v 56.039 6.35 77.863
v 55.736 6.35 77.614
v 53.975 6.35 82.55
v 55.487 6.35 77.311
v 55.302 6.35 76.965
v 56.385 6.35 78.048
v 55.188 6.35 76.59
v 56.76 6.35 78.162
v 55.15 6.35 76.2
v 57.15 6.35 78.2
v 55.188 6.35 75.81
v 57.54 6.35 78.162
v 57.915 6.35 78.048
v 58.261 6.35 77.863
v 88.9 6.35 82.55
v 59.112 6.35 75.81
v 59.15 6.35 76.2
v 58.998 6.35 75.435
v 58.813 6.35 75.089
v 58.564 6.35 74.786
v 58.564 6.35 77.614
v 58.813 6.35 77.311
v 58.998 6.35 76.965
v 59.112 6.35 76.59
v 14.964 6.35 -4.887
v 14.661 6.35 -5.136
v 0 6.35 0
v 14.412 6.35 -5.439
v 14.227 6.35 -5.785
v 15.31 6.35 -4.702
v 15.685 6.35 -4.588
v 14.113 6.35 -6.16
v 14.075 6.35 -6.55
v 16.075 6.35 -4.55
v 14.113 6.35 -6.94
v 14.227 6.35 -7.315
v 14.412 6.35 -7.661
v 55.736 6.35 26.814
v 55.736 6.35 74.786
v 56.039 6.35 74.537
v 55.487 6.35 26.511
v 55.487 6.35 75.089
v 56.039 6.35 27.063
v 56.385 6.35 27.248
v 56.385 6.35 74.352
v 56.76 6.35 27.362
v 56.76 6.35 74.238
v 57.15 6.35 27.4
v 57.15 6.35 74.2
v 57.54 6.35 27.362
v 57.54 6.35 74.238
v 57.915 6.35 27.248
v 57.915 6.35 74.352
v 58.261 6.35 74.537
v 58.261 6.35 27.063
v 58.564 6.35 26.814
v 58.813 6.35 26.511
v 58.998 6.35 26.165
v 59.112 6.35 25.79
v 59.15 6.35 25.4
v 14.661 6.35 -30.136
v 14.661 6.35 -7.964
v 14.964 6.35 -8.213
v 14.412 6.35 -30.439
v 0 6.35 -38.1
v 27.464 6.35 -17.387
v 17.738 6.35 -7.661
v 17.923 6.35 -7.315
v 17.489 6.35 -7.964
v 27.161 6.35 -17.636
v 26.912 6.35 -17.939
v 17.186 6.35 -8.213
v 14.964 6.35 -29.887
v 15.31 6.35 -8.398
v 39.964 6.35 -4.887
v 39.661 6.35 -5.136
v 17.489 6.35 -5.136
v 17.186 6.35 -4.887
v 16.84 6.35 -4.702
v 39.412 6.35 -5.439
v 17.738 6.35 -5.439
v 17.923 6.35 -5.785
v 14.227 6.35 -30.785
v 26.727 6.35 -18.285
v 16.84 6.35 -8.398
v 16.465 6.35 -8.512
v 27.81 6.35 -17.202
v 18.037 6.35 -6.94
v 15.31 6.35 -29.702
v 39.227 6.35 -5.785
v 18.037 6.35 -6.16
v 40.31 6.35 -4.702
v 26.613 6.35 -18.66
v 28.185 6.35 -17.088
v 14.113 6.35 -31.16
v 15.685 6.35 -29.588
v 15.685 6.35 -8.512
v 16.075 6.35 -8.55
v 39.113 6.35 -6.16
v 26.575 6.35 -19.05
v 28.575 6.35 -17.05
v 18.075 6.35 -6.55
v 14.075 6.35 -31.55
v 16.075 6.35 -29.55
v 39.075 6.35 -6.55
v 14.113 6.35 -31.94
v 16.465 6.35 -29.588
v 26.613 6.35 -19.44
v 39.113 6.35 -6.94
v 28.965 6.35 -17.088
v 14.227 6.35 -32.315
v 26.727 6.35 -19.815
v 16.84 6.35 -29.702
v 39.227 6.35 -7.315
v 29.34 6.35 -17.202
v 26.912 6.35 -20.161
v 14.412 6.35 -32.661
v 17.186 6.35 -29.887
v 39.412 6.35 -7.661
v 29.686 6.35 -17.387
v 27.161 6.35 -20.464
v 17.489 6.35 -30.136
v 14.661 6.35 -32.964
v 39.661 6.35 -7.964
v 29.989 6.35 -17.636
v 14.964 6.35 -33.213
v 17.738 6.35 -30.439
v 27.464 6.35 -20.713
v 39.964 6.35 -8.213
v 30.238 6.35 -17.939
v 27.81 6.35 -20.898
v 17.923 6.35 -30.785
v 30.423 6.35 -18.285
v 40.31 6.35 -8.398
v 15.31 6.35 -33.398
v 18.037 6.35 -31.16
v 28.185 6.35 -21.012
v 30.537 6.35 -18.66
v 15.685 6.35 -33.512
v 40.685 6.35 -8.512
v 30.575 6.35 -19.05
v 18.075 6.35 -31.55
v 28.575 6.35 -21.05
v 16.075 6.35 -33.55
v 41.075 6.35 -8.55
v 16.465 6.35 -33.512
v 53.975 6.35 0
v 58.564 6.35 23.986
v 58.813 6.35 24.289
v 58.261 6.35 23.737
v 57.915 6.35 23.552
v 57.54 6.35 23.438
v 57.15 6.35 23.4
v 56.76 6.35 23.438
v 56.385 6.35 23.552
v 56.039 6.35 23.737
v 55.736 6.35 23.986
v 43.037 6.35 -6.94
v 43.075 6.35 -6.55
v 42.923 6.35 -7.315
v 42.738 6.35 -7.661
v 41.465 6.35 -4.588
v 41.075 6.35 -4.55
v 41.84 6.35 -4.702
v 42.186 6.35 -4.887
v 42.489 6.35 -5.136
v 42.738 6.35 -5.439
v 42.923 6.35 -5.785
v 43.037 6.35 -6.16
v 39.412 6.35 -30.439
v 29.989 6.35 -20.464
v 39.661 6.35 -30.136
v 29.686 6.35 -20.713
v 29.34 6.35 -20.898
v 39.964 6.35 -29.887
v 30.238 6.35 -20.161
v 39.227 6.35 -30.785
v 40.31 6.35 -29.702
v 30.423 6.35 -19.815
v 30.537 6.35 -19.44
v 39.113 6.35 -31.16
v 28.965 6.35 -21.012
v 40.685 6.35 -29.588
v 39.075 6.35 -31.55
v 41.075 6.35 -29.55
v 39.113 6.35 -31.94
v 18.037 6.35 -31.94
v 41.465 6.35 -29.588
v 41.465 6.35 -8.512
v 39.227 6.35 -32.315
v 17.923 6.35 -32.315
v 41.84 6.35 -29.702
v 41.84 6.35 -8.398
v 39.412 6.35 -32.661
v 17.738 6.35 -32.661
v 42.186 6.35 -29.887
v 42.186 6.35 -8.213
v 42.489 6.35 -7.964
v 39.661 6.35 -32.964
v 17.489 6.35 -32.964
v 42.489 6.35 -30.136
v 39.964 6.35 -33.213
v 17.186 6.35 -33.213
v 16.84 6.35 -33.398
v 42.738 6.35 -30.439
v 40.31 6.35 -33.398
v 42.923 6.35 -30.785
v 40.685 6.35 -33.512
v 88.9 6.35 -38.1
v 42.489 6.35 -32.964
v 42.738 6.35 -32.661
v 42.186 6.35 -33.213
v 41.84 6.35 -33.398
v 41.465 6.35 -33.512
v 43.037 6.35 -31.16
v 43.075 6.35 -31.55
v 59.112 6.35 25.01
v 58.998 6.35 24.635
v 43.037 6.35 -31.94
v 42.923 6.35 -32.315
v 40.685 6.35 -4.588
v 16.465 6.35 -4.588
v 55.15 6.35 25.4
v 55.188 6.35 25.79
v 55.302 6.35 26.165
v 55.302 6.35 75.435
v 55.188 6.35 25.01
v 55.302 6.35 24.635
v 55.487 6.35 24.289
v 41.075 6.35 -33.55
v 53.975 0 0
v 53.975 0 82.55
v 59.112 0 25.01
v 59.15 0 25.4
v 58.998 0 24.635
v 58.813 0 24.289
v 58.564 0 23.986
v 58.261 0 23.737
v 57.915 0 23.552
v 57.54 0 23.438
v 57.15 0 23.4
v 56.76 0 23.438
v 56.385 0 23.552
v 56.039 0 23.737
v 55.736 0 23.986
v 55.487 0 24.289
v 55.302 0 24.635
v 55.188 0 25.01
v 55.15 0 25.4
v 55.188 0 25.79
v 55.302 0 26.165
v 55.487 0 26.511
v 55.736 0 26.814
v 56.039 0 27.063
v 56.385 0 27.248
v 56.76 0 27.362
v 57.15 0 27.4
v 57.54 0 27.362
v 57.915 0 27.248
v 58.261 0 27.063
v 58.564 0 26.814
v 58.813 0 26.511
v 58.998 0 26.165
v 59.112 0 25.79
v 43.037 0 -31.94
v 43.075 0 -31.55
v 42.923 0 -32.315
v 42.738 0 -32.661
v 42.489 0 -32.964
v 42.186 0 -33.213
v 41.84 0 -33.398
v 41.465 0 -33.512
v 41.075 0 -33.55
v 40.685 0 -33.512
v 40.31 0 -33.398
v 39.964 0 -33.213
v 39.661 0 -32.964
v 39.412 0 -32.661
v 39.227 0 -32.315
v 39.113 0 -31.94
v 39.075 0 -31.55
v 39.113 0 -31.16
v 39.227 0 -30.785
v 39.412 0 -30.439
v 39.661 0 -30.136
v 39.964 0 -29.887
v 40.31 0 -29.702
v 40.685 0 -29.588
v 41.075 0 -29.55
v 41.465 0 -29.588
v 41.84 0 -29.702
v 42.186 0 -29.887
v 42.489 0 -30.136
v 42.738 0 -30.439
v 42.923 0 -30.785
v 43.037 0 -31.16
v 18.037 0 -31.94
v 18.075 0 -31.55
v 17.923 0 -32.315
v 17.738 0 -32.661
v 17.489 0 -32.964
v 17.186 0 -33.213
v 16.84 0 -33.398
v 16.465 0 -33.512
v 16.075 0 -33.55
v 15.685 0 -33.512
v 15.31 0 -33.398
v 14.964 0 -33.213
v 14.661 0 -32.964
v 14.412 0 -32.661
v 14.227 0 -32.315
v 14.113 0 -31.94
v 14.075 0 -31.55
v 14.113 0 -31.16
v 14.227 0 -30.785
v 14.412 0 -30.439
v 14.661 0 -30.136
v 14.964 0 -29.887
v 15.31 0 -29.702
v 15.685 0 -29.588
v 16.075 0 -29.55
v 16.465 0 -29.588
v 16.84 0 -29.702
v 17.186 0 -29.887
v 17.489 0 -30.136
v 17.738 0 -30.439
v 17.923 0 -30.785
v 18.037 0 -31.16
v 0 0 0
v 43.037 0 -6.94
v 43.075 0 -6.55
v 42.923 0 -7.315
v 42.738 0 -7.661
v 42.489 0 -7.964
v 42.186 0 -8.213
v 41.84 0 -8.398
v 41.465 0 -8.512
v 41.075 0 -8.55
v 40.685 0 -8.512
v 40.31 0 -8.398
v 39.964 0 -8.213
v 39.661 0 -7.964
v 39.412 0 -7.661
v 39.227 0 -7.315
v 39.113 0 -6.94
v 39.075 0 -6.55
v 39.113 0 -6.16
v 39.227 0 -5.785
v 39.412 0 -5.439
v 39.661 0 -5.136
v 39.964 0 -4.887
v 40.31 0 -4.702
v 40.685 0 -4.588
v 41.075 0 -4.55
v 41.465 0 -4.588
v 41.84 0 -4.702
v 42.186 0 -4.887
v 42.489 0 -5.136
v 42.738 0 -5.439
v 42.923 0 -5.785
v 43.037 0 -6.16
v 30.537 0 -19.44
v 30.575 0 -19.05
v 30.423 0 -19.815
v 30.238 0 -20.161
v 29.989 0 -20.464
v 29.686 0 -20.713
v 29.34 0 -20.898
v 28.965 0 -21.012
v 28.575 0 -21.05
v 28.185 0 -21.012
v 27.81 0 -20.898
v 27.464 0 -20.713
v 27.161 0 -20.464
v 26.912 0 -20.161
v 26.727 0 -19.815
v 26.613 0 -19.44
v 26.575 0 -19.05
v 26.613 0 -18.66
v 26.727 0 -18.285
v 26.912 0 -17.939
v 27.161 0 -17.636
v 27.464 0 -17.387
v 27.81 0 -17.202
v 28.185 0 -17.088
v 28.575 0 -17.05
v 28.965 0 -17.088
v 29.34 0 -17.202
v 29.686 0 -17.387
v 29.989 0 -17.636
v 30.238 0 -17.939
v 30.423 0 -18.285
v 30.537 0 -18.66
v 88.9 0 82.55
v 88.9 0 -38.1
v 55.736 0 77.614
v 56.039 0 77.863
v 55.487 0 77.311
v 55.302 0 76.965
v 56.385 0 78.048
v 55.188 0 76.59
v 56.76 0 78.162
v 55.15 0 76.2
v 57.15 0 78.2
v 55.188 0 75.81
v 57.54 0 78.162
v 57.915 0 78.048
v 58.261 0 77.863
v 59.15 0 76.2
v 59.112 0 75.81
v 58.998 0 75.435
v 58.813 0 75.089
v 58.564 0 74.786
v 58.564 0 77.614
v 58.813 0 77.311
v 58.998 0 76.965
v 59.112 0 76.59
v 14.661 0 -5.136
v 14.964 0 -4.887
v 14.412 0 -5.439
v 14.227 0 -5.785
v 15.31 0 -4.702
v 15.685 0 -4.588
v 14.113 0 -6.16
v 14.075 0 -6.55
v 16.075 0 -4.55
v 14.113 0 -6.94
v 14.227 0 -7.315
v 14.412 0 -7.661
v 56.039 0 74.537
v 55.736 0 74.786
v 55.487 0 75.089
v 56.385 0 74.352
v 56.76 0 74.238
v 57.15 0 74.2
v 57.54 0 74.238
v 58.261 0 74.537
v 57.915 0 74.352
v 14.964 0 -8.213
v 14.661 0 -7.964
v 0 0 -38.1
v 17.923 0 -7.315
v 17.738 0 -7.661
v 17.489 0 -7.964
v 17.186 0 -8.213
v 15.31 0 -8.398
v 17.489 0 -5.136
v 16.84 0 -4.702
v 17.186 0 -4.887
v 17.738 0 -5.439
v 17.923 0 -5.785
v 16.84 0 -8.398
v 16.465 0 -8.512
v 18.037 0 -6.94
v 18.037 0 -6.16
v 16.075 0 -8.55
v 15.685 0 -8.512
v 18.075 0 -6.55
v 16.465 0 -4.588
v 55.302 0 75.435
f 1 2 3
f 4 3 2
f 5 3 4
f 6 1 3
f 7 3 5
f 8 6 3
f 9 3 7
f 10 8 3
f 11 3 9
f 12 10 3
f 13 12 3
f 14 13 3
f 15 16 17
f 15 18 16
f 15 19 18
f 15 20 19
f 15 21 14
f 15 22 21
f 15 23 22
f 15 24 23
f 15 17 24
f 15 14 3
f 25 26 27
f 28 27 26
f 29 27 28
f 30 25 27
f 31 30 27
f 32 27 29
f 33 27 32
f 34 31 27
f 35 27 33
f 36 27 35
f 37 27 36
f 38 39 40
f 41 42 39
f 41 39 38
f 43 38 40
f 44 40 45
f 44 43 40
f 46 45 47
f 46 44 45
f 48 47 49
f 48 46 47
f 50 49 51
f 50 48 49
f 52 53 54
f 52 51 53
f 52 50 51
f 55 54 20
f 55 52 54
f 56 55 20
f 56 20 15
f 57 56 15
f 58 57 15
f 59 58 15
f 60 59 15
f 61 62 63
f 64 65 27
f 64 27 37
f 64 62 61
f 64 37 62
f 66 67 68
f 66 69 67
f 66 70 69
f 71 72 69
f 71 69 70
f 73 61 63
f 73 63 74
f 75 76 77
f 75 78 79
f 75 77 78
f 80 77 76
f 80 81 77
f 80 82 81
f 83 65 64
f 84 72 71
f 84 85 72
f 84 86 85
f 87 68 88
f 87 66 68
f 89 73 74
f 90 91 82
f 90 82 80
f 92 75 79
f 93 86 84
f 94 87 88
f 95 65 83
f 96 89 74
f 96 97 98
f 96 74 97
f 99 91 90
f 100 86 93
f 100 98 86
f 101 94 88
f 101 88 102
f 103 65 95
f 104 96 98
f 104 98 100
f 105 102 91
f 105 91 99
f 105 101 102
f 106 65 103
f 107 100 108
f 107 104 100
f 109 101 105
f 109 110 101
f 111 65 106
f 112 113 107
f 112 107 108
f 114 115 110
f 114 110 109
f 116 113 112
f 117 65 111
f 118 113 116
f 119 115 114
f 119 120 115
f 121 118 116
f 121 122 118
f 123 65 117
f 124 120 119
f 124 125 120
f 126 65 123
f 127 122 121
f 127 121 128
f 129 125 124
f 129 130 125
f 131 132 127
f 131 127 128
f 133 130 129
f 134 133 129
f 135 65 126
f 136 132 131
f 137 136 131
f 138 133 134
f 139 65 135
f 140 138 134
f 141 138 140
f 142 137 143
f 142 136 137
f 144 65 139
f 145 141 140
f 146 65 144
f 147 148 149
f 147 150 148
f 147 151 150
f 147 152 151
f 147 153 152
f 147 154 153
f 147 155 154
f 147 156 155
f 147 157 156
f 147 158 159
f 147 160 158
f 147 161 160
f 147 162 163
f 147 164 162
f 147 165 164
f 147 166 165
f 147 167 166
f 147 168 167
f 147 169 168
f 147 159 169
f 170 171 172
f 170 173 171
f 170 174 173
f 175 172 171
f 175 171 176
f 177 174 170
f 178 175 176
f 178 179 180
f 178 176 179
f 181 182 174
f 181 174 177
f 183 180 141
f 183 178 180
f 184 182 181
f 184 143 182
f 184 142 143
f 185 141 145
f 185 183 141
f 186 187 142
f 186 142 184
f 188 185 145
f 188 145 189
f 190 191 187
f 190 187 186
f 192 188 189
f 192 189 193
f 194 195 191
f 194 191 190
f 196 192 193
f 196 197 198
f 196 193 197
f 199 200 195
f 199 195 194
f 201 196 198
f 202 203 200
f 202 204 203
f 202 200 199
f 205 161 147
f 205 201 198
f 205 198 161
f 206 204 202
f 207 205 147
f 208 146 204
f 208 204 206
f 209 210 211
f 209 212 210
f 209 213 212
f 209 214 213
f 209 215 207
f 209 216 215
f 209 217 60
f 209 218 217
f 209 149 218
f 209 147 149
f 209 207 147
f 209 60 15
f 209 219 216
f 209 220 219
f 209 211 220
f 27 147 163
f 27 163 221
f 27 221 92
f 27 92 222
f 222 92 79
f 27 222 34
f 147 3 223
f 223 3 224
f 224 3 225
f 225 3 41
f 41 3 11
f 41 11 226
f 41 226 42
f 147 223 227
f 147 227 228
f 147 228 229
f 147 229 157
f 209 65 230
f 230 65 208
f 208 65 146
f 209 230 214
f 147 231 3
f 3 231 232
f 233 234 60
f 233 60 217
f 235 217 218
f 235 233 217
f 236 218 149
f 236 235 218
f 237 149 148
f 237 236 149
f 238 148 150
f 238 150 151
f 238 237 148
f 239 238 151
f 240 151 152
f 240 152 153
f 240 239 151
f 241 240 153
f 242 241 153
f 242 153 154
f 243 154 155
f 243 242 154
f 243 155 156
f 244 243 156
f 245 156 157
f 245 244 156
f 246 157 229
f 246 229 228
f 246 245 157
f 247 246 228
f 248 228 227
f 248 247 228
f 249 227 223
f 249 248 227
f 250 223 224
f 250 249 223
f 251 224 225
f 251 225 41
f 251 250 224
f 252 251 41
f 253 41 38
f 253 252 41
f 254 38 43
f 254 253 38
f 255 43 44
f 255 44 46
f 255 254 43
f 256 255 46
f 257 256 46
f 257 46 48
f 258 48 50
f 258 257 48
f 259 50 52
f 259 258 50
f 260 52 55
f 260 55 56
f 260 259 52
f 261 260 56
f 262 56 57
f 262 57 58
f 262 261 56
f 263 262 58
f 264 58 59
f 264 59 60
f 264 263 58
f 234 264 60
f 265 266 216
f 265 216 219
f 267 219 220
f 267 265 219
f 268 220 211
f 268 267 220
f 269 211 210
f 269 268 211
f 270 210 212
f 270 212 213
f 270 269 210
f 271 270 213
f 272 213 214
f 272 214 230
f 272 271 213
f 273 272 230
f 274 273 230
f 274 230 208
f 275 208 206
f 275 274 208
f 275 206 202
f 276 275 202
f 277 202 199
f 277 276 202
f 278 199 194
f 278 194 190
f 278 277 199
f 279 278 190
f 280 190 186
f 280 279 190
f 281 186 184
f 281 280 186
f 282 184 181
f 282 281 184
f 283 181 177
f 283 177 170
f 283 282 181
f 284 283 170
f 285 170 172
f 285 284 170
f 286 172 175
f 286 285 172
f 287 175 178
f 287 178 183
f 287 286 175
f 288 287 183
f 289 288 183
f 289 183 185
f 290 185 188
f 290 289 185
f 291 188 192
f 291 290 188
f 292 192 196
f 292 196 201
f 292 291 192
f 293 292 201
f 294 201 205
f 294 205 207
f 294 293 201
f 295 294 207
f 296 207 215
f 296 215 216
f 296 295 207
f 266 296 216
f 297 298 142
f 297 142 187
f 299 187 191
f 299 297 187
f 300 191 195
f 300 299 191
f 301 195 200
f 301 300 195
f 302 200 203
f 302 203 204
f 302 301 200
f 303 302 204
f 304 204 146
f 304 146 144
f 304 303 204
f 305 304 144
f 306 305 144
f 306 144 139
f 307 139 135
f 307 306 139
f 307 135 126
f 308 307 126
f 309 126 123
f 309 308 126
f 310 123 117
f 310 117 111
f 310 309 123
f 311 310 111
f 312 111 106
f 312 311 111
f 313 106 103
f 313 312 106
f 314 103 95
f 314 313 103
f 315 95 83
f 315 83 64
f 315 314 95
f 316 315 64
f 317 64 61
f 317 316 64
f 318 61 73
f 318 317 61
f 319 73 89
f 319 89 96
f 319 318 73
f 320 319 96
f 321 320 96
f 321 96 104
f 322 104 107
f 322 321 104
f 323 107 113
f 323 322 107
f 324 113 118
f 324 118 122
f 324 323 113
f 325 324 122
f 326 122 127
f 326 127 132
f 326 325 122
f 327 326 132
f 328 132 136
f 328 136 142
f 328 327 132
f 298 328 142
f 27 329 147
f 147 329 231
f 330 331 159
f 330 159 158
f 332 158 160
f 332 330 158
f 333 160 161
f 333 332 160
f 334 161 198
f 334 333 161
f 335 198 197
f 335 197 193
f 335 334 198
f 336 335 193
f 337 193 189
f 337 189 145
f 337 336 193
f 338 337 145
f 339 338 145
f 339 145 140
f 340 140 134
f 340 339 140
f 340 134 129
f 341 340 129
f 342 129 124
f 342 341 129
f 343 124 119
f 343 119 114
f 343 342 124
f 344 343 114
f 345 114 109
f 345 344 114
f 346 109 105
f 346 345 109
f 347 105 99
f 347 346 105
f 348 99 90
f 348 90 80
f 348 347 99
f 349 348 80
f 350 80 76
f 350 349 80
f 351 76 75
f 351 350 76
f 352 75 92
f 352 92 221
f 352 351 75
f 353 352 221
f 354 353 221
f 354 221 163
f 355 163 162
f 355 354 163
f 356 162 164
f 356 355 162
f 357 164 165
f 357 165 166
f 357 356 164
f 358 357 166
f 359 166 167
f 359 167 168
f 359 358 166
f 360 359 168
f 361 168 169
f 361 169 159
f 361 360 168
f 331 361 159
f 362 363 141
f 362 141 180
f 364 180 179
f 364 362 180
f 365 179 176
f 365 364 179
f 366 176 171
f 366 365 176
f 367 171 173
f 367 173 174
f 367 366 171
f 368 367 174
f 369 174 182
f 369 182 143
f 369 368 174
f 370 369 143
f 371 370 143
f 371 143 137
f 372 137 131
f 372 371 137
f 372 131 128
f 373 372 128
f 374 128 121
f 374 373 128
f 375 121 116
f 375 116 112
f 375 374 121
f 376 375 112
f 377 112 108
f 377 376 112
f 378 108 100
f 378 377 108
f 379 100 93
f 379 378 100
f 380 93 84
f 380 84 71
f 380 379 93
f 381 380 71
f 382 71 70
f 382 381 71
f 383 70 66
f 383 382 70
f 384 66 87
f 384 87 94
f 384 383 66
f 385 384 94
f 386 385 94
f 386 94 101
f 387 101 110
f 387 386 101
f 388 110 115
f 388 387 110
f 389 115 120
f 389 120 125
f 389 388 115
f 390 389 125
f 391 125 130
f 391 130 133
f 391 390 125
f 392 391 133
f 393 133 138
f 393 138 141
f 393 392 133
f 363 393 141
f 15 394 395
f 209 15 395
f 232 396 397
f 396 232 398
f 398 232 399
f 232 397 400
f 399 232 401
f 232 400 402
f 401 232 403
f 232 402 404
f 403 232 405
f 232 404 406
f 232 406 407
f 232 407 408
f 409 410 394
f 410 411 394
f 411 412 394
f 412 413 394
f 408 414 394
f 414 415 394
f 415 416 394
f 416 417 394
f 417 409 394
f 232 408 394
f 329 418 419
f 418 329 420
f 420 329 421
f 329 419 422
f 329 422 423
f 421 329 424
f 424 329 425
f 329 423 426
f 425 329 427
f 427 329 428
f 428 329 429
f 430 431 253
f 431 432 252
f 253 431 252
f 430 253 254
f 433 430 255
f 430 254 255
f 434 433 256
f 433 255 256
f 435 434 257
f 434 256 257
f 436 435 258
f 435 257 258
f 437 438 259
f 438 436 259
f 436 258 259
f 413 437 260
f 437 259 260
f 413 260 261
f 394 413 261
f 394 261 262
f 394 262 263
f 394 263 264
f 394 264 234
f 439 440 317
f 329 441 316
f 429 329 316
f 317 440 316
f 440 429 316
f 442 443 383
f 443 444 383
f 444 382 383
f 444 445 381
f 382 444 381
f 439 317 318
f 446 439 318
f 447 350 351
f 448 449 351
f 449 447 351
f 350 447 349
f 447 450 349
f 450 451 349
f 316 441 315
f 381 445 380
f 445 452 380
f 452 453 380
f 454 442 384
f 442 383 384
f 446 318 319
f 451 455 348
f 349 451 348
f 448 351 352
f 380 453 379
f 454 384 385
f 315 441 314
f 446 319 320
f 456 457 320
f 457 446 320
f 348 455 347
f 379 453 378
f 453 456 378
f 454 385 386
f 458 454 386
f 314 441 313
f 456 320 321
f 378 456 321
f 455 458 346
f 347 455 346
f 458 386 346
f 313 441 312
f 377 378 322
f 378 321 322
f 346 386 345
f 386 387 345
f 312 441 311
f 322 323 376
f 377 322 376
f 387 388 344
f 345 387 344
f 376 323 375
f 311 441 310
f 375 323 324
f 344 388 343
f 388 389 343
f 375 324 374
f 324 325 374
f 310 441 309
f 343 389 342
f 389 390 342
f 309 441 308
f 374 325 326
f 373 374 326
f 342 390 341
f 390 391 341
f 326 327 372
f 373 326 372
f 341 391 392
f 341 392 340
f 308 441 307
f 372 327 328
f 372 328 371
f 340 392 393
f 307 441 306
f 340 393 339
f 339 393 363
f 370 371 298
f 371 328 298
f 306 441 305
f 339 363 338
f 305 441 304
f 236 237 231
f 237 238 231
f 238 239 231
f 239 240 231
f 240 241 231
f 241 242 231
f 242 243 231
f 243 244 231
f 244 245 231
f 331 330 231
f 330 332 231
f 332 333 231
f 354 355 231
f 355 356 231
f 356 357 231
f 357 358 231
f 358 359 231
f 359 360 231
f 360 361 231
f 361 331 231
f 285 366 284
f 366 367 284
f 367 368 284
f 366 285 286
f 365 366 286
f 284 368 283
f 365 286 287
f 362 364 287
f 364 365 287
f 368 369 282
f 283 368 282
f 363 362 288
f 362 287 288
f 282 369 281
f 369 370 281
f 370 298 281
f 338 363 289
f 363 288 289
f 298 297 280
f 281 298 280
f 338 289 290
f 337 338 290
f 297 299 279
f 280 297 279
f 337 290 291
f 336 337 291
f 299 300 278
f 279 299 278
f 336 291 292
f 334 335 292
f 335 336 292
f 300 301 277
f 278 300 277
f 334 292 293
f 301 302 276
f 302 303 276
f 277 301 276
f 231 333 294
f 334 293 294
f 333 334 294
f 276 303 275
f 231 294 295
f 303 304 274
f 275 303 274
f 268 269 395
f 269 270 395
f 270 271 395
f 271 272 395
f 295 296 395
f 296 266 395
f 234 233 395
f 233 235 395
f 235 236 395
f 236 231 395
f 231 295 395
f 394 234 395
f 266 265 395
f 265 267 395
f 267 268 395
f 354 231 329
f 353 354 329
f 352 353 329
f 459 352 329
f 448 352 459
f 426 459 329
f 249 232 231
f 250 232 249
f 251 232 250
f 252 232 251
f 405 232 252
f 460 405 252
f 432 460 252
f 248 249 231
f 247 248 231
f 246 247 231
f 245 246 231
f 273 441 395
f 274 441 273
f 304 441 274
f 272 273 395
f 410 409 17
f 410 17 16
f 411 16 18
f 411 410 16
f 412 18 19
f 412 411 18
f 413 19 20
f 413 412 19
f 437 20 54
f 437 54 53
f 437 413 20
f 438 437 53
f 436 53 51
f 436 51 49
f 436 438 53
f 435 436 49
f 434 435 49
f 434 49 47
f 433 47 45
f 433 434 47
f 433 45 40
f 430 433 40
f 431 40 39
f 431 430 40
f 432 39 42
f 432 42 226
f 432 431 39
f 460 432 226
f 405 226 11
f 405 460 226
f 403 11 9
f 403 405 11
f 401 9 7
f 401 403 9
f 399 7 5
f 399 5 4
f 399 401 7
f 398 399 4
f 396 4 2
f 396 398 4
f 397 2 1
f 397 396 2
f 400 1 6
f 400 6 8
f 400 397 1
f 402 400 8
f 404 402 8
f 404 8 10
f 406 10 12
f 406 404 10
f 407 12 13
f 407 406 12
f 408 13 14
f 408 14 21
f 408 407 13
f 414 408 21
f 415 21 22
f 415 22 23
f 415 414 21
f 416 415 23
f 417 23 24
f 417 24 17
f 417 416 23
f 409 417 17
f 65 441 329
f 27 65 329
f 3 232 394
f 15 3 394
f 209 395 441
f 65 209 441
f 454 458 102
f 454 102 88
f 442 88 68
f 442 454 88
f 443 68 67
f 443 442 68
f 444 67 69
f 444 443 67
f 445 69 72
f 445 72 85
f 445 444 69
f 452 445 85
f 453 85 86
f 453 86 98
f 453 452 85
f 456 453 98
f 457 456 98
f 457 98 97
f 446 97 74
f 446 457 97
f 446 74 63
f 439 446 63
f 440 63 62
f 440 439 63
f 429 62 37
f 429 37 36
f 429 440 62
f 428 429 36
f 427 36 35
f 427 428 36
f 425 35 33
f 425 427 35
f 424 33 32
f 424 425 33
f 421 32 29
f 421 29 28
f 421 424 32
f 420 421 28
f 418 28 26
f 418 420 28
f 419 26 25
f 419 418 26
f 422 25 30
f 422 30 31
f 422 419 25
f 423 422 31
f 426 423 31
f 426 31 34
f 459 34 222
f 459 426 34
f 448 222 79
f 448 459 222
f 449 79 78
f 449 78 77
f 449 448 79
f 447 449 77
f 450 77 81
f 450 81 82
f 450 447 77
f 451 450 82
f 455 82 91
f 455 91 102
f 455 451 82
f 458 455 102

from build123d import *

# Parameters (mm, degrees)
SKETCH1_R           = 2
BOSS_EXTRUDE1_DEPTH = 6.35


with BuildPart() as part:
    # Sketch1 → Boss-Extrude1 (new body)
    with BuildSketch(Plane(origin=(0, 0, 0), x_dir=(1, 0, 0), z_dir=(0, 1, 0))):
        Polygon((0, 38.1), (0, 0), (53.975, 0), (53.975, -82.55), (88.9, -82.55), (88.9, 0), (88.9, 38.1), (53.975, 38.1), align=None)
        with Locations((57.15, -76.2)):
            Circle(SKETCH1_R, mode=Mode.SUBTRACT)
        with Locations((57.15, -25.4)):
            Circle(SKETCH1_R, mode=Mode.SUBTRACT)
        with Locations((16.075, 6.55)):
            Circle(SKETCH1_R, mode=Mode.SUBTRACT)
        with Locations((41.075, 6.55)):
            Circle(SKETCH1_R, mode=Mode.SUBTRACT)
        with Locations((16.075, 31.55)):
            Circle(SKETCH1_R, mode=Mode.SUBTRACT)
        with Locations((28.575, 19.05)):
            Circle(SKETCH1_R, mode=Mode.SUBTRACT)
        with Locations((41.075, 31.55)):
            Circle(SKETCH1_R, mode=Mode.SUBTRACT)
    extrude(amount=BOSS_EXTRUDE1_DEPTH)


solid = part.part
